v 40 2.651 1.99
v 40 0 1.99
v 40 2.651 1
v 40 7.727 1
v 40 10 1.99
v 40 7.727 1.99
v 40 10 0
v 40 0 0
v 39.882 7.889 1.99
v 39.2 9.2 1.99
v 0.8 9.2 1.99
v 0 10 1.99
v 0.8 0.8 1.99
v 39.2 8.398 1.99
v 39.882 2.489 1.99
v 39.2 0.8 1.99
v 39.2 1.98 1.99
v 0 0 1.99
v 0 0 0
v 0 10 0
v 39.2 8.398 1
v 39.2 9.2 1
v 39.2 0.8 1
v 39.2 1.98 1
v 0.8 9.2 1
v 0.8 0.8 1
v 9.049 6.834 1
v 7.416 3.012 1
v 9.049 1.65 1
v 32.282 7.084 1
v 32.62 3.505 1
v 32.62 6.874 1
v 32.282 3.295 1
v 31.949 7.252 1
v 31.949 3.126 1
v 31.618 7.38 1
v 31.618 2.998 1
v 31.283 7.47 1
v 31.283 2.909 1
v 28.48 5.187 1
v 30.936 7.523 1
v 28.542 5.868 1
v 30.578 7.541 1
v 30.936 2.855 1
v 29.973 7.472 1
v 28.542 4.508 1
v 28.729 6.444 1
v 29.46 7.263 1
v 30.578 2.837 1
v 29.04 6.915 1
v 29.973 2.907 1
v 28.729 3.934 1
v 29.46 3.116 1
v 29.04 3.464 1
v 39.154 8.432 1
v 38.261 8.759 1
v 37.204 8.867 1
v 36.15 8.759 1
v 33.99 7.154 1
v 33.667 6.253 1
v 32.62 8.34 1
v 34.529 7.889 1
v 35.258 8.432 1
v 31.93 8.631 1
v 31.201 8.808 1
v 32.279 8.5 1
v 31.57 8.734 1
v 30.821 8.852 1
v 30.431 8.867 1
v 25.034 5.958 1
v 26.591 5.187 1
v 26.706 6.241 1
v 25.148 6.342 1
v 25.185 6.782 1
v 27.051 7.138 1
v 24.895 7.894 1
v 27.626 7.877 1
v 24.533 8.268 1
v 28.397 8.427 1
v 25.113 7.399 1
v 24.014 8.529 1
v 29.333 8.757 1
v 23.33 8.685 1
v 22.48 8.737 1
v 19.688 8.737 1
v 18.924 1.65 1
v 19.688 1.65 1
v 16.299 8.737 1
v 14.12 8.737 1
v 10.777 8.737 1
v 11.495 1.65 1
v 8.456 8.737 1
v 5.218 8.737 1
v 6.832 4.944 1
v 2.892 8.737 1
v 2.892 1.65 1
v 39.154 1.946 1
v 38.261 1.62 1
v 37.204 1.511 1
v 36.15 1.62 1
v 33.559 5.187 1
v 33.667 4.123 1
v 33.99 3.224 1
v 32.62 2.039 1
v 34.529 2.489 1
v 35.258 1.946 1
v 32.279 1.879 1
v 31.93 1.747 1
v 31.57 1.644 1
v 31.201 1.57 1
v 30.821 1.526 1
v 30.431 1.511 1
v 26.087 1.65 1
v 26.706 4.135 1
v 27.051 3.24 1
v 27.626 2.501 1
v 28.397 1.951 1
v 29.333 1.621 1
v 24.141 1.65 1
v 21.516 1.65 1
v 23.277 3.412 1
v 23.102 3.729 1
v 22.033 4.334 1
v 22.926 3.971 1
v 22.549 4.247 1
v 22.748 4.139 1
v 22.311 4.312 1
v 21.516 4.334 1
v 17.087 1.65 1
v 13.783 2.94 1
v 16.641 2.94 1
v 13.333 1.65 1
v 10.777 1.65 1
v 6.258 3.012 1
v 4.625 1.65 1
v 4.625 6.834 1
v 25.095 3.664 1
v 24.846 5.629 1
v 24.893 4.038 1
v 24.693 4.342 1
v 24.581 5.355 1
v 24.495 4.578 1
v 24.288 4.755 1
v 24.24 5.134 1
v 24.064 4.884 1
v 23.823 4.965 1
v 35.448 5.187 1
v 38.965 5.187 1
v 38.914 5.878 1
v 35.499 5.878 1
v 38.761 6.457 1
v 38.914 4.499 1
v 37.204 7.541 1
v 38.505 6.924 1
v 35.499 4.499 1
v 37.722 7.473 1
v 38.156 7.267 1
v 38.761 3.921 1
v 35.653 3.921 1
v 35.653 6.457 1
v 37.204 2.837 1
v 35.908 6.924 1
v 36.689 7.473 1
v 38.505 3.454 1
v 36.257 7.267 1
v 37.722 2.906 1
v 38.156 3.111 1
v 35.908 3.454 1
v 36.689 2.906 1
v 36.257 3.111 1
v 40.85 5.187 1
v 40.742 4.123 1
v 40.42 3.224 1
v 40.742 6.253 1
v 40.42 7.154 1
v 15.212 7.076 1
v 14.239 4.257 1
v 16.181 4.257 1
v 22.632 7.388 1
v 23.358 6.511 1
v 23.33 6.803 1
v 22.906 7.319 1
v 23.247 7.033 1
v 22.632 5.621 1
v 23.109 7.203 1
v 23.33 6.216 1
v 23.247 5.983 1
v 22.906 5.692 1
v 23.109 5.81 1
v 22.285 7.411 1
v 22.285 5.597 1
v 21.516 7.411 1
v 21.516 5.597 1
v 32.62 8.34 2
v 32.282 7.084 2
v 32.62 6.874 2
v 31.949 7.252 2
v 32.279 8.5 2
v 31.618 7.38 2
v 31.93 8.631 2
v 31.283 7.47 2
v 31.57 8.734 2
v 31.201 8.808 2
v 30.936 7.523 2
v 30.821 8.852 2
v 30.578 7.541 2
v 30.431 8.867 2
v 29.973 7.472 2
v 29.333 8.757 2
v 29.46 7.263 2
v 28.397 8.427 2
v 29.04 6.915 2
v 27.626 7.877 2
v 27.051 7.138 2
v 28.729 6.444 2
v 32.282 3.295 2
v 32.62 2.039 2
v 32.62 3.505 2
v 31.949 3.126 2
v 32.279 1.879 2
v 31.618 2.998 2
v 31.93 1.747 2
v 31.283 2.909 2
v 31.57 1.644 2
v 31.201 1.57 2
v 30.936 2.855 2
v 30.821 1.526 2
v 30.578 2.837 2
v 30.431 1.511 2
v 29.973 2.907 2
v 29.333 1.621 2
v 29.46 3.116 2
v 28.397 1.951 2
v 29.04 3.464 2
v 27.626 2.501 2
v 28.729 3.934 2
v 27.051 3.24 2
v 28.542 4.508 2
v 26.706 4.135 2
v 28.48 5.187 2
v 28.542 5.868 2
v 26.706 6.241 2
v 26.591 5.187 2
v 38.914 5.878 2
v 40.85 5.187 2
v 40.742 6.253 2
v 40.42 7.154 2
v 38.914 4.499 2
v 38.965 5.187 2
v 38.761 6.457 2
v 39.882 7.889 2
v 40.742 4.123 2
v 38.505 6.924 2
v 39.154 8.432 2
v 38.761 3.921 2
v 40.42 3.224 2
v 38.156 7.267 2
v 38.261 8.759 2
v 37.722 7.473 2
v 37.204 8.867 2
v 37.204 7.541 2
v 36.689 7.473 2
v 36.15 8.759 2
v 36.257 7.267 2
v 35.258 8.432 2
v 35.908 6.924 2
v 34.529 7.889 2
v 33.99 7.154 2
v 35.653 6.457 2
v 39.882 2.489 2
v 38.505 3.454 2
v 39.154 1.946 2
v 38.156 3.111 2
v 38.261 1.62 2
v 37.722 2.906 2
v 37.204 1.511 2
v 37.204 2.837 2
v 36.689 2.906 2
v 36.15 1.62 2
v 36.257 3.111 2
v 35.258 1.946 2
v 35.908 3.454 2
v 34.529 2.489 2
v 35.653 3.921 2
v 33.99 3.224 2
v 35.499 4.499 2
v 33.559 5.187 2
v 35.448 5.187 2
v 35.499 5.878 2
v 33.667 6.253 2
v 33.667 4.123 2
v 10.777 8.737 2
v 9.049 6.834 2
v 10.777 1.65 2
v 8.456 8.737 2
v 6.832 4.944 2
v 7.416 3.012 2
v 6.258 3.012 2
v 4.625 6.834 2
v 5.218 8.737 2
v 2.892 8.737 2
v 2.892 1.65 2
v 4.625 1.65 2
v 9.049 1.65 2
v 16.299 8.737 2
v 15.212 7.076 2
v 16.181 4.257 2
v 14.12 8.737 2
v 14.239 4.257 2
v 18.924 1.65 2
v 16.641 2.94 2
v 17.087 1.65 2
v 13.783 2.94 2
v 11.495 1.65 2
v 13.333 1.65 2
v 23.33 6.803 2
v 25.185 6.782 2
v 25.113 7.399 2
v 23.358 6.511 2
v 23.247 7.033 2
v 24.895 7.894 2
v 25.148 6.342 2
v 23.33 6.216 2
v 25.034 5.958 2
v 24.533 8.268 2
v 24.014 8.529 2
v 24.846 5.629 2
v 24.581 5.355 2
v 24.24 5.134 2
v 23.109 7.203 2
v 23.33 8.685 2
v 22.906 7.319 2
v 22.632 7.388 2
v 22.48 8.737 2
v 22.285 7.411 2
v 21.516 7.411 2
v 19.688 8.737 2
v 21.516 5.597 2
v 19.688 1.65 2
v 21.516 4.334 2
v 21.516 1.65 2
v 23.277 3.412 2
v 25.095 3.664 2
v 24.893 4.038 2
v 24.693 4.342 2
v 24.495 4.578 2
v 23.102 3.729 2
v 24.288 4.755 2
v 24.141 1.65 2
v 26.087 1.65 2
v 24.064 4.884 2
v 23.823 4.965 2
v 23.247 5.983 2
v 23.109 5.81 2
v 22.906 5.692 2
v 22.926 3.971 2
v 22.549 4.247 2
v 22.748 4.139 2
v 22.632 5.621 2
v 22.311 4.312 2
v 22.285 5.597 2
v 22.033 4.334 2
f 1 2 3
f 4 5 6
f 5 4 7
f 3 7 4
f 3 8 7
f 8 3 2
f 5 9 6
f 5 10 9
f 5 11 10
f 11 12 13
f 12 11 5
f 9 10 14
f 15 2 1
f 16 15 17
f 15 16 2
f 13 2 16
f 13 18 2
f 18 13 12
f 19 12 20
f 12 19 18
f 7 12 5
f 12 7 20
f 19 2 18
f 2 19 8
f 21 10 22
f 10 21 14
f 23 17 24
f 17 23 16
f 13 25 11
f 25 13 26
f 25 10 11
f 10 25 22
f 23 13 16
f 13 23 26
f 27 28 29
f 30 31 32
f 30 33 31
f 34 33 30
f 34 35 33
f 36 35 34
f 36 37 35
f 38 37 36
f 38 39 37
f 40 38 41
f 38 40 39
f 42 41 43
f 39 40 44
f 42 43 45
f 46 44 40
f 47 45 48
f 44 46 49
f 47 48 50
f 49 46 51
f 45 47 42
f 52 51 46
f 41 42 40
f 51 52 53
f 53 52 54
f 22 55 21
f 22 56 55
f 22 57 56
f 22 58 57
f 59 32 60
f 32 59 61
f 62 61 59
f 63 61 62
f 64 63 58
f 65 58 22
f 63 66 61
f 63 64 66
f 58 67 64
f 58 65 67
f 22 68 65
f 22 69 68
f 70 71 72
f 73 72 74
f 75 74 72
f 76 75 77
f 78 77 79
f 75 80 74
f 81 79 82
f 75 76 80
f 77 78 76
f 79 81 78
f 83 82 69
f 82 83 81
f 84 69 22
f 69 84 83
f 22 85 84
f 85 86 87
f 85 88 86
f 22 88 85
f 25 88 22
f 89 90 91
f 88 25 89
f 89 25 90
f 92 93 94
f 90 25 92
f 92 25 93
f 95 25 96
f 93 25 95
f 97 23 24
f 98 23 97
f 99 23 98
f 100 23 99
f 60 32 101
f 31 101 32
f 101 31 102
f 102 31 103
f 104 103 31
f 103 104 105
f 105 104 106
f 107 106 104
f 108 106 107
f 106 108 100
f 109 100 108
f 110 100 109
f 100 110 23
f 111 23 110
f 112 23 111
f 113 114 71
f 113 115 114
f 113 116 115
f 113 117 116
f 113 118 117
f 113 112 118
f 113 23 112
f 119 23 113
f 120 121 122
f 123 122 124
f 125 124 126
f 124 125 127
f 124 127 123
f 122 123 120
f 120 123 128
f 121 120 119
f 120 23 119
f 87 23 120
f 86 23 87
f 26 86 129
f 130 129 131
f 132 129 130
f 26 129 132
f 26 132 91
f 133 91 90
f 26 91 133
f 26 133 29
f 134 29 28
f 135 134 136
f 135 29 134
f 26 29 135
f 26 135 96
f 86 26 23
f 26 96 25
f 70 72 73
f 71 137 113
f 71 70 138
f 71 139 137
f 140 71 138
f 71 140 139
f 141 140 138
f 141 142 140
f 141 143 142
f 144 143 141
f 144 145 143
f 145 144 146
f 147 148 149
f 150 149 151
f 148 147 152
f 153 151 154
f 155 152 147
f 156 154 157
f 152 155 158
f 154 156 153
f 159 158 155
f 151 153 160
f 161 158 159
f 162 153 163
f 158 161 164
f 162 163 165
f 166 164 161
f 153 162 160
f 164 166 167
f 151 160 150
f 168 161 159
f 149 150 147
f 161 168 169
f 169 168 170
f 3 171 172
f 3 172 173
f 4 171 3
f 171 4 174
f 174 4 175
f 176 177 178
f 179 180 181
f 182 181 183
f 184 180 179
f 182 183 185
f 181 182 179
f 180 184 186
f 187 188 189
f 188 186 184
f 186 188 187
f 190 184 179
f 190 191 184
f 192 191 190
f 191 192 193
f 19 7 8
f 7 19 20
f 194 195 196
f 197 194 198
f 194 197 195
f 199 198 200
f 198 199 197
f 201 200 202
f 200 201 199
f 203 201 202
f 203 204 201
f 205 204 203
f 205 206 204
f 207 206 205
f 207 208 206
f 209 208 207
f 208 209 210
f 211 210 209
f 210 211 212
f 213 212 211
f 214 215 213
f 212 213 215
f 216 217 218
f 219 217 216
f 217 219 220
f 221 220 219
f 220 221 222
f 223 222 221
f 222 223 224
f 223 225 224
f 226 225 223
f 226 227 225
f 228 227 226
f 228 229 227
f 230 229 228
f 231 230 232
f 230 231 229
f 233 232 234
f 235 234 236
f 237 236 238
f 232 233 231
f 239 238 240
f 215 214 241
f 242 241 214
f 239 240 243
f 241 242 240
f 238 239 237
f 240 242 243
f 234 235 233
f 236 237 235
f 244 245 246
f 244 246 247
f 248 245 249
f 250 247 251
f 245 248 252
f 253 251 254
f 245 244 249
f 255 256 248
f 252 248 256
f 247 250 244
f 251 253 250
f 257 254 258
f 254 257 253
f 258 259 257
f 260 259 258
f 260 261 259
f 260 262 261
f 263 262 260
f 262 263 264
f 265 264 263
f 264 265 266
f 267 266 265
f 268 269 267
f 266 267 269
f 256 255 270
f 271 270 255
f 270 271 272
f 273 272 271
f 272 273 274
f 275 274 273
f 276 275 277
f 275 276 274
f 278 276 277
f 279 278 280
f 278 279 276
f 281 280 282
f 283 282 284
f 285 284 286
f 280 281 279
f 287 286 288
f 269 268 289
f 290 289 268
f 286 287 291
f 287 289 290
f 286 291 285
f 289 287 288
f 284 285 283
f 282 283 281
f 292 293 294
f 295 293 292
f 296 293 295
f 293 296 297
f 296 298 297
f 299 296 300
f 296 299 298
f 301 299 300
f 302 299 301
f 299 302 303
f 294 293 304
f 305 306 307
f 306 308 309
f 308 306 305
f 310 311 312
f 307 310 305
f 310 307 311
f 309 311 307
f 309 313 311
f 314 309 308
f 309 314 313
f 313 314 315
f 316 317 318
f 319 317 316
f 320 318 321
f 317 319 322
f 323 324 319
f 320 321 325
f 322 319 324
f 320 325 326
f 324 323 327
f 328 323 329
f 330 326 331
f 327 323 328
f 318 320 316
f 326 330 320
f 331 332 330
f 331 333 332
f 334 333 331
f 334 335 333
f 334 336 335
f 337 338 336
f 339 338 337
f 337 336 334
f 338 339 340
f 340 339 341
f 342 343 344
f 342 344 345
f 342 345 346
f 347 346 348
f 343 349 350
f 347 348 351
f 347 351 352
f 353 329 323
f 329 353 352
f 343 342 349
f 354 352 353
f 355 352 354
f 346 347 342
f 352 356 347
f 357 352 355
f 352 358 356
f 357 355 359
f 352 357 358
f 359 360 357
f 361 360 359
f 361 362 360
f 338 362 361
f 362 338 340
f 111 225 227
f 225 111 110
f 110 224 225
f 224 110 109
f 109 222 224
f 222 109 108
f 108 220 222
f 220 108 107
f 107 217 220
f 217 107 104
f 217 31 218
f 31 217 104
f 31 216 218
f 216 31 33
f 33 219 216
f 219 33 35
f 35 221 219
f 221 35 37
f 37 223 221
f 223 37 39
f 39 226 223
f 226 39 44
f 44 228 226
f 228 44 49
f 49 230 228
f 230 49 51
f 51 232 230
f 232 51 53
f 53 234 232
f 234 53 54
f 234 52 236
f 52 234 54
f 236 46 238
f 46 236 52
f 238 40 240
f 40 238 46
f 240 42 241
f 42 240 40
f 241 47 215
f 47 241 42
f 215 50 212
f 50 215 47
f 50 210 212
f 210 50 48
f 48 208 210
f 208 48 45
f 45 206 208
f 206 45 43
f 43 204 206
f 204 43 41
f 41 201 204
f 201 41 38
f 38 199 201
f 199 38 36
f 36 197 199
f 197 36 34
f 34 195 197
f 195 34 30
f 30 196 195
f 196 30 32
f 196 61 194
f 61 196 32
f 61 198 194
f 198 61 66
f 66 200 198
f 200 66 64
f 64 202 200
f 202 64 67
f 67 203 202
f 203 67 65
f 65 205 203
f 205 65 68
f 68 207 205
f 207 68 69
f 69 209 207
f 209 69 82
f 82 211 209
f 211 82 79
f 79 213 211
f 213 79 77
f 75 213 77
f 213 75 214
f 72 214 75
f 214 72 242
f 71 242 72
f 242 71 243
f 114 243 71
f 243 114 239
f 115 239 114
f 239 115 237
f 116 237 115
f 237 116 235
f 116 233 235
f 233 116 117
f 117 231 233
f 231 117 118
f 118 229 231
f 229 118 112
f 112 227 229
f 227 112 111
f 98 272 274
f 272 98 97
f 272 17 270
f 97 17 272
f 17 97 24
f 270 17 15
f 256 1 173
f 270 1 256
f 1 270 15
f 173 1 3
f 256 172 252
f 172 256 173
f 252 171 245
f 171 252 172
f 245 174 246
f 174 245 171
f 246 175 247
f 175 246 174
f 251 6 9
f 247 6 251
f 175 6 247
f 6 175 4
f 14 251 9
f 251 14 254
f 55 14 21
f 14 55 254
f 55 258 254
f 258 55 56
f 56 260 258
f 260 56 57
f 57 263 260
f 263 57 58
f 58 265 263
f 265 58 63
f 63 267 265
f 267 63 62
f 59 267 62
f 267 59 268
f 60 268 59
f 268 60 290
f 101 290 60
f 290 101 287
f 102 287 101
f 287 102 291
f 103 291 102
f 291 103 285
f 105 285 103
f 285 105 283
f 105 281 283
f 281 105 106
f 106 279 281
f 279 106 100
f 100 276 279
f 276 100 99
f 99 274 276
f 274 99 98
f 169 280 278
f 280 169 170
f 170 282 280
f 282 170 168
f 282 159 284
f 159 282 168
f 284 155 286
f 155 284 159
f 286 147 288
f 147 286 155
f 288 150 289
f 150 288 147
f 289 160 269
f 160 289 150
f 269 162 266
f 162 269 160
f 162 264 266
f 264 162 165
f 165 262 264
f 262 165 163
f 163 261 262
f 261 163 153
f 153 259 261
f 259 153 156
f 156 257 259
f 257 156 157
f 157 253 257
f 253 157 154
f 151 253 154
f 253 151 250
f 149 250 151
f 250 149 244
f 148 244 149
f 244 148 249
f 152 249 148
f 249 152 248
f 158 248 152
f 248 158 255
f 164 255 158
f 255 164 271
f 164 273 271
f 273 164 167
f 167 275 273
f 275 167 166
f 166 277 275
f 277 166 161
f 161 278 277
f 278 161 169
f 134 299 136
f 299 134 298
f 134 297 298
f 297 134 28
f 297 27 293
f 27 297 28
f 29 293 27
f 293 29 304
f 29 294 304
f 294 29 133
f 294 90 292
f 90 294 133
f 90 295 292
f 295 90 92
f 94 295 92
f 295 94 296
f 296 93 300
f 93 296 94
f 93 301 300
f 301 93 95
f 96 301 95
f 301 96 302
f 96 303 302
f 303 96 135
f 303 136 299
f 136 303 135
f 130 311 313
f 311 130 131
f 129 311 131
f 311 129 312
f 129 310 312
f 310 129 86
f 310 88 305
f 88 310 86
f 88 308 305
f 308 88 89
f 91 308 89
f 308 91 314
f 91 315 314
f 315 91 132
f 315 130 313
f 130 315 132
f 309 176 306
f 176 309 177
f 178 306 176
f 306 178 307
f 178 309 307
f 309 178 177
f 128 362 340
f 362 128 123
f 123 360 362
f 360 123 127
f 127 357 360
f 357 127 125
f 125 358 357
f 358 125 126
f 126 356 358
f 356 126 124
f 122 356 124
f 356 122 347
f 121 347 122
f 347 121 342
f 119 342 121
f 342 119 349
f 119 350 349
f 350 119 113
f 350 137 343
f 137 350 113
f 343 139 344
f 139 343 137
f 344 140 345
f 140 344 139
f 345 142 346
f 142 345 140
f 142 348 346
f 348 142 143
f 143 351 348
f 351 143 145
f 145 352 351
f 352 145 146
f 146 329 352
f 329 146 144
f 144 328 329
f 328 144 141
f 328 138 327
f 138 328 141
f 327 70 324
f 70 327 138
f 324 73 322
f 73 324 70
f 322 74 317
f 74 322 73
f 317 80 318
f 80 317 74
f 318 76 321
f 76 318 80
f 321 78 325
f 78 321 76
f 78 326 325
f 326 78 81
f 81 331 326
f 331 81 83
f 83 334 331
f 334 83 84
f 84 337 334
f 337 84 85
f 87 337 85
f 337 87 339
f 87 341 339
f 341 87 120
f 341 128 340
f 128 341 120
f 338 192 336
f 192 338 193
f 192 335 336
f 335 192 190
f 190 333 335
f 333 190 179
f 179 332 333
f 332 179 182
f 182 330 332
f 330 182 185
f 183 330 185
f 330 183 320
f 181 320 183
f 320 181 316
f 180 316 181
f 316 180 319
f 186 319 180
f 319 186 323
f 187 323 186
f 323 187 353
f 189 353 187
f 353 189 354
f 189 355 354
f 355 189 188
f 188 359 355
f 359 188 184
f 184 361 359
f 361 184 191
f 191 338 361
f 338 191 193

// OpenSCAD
plate_y=10;
plate_x=plate_y *4;
plate_z=1;
plate_frame=1.6;
plate_text_z=1;

union(){
    color("black")
    cube([plate_x, plate_y, plate_z]);
    translate([0,0,plate_z-.01])
    color("white")
    difference(){
        cube([plate_x, plate_y, plate_text_z]);
        translate([plate_frame/2,plate_frame/2,-.5])
        cube([plate_x-plate_frame, plate_y-plate_frame, plate_text_z+2]);
    }

    color("white")
    translate([plate_x*.05,plate_y*.165,plate_z])
    linear_extrude(height = plate_text_z) {
        text("MARCO", size = 7, font = "Arial Bold:style=Bold");
    }
}
